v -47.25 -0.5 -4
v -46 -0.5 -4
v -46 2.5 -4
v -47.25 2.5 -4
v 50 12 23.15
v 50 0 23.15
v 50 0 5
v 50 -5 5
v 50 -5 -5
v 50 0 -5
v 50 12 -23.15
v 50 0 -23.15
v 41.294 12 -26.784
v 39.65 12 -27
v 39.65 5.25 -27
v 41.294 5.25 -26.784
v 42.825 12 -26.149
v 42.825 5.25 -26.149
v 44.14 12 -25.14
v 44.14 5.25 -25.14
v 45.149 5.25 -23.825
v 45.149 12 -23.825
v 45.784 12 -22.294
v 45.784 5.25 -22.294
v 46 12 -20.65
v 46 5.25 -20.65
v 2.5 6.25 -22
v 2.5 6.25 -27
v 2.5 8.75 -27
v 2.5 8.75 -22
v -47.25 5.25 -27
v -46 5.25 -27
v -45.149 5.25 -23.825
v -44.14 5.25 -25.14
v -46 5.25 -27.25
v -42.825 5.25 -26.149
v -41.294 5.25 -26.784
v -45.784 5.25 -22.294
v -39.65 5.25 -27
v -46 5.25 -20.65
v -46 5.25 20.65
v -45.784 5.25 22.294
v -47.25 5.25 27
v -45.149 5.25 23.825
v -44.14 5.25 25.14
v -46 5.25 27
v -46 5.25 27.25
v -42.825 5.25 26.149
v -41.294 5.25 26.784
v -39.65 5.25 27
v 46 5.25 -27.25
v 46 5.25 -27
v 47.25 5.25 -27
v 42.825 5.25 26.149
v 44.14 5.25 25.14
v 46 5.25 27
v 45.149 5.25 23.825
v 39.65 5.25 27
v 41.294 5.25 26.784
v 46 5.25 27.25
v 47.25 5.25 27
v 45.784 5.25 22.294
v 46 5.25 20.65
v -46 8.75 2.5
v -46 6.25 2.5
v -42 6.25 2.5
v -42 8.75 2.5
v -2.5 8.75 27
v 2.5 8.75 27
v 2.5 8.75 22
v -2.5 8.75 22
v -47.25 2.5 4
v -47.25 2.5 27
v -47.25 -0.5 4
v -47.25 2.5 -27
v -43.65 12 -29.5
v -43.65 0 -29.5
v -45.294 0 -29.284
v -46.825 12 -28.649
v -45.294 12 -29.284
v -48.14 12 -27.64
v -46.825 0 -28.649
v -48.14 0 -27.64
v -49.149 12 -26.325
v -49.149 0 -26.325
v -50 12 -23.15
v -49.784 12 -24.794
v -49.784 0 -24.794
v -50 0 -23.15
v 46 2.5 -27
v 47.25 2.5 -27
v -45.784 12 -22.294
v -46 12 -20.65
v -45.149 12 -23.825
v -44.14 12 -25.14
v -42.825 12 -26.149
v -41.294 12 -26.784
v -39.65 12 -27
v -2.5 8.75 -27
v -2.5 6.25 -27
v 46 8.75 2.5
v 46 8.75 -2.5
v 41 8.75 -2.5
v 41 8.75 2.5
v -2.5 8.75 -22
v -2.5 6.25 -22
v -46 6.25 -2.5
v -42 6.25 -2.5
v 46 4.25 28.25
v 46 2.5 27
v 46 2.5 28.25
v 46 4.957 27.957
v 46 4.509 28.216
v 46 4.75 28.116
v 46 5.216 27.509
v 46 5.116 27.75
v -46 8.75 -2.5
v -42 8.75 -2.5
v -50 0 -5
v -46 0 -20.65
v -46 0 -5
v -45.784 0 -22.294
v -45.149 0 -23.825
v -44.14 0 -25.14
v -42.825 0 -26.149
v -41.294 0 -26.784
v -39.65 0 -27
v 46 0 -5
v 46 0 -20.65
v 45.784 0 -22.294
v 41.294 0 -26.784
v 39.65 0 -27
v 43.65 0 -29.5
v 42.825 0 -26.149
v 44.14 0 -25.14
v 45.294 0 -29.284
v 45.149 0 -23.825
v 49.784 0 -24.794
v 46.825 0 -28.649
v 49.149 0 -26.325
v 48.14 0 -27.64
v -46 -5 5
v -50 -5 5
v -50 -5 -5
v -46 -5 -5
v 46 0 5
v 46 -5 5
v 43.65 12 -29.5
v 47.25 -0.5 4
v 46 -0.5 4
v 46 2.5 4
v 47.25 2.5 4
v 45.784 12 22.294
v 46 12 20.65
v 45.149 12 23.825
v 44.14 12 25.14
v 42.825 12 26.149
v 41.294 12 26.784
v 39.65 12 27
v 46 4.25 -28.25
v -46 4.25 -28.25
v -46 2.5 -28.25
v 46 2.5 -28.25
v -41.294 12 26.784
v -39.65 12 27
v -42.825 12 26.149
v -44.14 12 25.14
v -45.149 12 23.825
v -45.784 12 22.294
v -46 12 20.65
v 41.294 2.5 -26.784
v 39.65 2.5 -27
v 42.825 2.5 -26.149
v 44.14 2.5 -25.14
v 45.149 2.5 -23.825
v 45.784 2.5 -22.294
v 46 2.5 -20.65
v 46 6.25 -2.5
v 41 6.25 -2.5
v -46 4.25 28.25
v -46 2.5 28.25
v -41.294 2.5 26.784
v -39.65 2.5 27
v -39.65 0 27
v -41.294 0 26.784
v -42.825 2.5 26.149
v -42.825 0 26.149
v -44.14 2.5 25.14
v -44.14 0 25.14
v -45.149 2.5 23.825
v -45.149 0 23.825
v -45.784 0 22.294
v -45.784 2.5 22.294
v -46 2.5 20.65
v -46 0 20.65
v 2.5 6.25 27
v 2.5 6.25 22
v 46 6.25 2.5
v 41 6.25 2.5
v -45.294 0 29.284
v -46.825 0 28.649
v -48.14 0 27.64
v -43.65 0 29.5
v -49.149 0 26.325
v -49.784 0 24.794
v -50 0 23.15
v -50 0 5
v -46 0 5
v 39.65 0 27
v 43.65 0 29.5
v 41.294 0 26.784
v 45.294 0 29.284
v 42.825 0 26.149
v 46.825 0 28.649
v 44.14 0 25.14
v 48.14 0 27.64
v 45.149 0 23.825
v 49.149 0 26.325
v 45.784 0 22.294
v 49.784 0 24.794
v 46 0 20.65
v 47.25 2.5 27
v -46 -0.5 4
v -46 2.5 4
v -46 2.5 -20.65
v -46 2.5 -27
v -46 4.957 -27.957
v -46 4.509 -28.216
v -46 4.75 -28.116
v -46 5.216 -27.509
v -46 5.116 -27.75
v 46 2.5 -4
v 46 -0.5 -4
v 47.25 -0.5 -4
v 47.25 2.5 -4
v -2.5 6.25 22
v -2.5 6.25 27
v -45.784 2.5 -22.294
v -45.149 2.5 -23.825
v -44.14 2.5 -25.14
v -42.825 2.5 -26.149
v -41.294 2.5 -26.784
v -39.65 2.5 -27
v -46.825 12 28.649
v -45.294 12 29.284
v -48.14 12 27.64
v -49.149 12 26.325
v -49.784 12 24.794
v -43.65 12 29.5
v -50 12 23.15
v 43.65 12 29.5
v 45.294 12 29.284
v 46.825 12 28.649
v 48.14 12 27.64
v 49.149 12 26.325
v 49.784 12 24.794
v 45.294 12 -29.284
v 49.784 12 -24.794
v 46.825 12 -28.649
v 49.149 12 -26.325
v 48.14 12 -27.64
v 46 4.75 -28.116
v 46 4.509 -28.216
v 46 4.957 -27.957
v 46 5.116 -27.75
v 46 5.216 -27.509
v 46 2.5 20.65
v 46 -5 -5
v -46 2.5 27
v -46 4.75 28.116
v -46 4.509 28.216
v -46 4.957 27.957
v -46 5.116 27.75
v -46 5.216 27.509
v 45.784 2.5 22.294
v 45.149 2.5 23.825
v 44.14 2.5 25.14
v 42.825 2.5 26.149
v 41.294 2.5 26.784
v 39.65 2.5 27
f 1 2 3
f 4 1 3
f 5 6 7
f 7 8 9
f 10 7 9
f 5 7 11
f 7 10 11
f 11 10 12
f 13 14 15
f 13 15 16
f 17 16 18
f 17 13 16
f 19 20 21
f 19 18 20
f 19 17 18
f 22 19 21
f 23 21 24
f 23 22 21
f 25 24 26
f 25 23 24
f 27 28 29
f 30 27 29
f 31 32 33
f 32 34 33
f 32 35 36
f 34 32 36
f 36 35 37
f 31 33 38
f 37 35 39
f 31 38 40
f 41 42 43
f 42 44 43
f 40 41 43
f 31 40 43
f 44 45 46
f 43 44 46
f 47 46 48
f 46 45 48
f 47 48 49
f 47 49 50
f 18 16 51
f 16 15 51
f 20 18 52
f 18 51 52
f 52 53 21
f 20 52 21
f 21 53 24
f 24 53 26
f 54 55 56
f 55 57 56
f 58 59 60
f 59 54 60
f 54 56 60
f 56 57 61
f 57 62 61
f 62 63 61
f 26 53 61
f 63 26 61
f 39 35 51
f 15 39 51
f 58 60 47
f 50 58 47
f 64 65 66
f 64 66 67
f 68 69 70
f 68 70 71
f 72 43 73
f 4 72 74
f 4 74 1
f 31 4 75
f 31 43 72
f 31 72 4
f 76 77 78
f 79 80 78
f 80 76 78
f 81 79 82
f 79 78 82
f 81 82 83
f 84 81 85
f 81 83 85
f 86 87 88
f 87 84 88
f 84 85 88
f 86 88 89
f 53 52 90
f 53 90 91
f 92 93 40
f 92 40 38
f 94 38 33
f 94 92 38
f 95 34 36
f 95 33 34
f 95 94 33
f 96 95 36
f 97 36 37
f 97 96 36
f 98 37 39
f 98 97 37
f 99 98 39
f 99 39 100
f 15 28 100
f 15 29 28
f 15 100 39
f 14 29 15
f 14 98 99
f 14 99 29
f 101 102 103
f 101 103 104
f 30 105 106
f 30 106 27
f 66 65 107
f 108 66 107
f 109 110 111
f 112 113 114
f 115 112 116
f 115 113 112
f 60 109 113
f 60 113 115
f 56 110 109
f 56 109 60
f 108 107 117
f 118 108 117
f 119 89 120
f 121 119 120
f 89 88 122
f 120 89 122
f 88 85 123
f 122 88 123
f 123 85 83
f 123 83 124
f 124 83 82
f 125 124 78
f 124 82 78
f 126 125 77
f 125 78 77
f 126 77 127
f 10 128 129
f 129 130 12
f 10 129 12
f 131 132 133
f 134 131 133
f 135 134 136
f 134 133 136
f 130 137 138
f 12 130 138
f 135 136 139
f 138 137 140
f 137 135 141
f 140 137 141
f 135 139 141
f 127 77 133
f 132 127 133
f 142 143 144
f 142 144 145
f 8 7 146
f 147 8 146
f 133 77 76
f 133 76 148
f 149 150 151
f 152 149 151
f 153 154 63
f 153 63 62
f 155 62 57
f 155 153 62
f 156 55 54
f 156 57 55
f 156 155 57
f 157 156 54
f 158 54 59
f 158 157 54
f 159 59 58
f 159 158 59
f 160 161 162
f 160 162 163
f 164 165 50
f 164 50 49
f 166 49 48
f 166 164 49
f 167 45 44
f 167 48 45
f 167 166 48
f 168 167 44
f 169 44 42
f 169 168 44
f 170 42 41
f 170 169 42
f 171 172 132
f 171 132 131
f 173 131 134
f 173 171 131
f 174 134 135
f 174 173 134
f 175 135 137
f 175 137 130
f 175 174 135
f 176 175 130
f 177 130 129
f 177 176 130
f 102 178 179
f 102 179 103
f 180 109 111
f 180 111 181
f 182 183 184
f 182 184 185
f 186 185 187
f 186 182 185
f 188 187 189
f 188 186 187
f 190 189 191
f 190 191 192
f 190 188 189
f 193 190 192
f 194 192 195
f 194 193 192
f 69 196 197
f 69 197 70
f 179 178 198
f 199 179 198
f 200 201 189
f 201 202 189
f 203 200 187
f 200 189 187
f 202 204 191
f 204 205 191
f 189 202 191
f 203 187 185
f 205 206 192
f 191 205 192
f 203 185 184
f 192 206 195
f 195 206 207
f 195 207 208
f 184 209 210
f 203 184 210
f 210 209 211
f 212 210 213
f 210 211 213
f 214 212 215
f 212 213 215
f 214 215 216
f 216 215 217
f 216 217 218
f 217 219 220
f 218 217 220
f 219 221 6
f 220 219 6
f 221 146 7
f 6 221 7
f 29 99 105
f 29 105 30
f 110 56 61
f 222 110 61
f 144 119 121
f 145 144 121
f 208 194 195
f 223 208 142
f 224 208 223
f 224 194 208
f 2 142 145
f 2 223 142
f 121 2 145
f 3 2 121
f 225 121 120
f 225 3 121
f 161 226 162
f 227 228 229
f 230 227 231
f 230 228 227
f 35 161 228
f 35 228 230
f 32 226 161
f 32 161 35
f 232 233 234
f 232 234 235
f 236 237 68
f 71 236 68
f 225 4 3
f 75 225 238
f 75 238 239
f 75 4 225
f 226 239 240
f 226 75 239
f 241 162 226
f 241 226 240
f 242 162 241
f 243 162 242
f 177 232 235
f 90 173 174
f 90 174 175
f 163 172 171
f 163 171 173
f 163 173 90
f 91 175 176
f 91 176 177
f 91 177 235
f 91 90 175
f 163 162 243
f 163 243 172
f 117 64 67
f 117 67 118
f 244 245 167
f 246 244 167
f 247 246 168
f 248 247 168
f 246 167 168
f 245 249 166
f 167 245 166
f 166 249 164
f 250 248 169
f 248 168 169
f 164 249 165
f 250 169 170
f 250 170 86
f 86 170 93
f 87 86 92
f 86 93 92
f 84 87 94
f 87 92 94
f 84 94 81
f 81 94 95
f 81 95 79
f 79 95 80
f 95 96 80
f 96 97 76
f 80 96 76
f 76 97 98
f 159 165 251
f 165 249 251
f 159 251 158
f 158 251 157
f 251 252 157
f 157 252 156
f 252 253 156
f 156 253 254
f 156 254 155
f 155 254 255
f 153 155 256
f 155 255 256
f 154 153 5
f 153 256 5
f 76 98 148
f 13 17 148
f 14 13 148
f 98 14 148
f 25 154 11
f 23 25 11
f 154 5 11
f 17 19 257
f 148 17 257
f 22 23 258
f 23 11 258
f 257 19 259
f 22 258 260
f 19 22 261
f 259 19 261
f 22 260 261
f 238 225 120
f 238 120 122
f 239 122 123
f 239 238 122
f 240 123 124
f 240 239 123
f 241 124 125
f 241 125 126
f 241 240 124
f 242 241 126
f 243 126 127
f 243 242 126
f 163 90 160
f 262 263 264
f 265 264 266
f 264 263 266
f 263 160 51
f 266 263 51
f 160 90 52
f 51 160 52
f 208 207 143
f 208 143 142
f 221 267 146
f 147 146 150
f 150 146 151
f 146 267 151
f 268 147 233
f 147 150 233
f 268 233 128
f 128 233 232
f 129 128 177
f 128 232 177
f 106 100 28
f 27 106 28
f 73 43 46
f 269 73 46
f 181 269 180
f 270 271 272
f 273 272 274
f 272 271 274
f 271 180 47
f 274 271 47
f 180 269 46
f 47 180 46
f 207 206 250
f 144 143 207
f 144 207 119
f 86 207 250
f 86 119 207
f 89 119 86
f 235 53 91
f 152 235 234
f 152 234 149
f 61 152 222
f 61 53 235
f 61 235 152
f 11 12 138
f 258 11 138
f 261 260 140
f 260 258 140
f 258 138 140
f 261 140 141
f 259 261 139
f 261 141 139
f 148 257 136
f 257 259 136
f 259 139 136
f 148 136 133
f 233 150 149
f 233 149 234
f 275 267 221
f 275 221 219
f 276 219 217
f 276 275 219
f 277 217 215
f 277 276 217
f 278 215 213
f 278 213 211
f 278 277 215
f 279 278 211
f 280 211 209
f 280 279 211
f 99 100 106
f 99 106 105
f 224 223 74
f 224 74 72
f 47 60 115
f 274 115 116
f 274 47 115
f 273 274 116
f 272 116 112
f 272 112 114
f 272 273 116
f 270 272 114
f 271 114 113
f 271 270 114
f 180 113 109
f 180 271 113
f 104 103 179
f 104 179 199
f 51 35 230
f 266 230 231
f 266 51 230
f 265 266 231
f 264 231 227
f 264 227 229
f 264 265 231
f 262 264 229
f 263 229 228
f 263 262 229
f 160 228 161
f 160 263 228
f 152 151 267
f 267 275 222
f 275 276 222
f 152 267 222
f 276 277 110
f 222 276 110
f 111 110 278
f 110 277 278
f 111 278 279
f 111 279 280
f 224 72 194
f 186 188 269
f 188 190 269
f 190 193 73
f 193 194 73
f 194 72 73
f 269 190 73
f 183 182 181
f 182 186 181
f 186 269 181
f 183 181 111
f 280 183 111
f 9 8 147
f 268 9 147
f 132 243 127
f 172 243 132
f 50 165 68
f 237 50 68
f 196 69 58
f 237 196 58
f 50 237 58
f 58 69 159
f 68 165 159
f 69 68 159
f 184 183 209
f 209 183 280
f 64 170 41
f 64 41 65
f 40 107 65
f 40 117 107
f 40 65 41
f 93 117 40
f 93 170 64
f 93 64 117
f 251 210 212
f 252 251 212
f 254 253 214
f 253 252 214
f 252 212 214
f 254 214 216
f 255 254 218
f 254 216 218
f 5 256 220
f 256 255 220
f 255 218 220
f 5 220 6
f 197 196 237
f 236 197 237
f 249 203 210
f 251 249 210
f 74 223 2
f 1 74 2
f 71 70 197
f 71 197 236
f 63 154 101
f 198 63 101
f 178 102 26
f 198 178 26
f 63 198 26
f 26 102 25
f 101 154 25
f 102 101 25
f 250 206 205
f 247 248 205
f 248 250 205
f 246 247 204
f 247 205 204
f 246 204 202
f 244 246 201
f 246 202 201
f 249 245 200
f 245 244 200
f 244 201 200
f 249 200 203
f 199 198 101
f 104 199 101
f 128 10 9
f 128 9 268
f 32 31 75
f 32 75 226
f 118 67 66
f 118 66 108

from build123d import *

# Parameters (mm, degrees)
SKETCH1_W                      = 100
SKETCH1_H                      = 59
BOSS_EXTRUDE1_DEPTH            = 12
SKETCH2_W                      = 92
SKETCH2_H                      = 54
CUT_EXTRUDE1_DEPTH             = 60.281109976
SKETCH3_W                      = 54
SKETCH3_H                      = 2.75
CUT_EXTRUDE2_DEPTH             = 1.25
SKETCH4_W                      = 54
SKETCH4_H                      = 2.75
CUT_EXTRUDE3_DEPTH             = 1.25
SKETCH5_W                      = 92
SKETCH5_H                      = 2.75
CUT_EXTRUDE4_DEPTH             = 1.25
SKETCH6_W                      = 92
SKETCH6_H                      = 2.75
CUT_EXTRUDE5_DEPTH             = 1.25
FILLET1_R                      = 1
SKETCH7_W                      = 4
SKETCH7_H                      = 10
BOSS_EXTRUDE2_DEPTH            = 5
CUT_EXTRUDE6_REACH             = 103.145
SKETCH8_W                      = 8
SKETCH8_H                      = 3
CUT_EXTRUDE6_DIRECTION_2_REACH = 103.145
FILLET2_R                      = 6.35
SKETCH9_W                      = 5
SKETCH9_H                      = 2.5
BOSS_EXTRUDE3_DEPTH            = 5
SKETCH10_W                     = 5
SKETCH10_H                     = 2.5
BOSS_EXTRUDE4_DEPTH            = 5
SKETCH11_W                     = 5
SKETCH11_H                     = 2.5
BOSS_EXTRUDE5_DEPTH            = 5
SKETCH12_W                     = 5
SKETCH12_H                     = 2.5
BOSS_EXTRUDE6_DEPTH            = 4


with BuildPart() as part:
    # Sketch1 → Boss-Extrude1 (new body)
    with BuildSketch(Plane(origin=(0, 0, 0), x_dir=(1, 0, 0), z_dir=(0, 1, 0))):
        Rectangle(SKETCH1_W, SKETCH1_H)
    extrude(amount=BOSS_EXTRUDE1_DEPTH)

    # Sketch2 → Cut-Extrude1 (cut, through all)
    with BuildSketch(Plane(origin=(0, 12, 0), x_dir=(1, 0, 0), z_dir=(0, 1, 0))):
        Rectangle(SKETCH2_W, SKETCH2_H)
    extrude(amount=-CUT_EXTRUDE1_DEPTH, mode=Mode.SUBTRACT)

    # Sketch3 → Cut-Extrude2 (cut)
    with BuildSketch(Plane(origin=(-46, 0, 0), x_dir=(0, 0, -1), z_dir=(1, 0, 0))):
        with Locations((0, 3.875)):
            Rectangle(SKETCH3_W, SKETCH3_H)
    extrude(amount=-CUT_EXTRUDE2_DEPTH, mode=Mode.SUBTRACT)

    # Sketch4 → Cut-Extrude3 (cut)
    with BuildSketch(Plane.ZY.offset(-46)):
        with Locations((0, 3.875)):
            Rectangle(SKETCH4_W, SKETCH4_H)
    extrude(amount=-CUT_EXTRUDE3_DEPTH, mode=Mode.SUBTRACT)

    # Sketch5 → Cut-Extrude4 (cut)
    with BuildSketch(Plane.XY.offset(-27)):
        with Locations((0, 3.875)):
            Rectangle(SKETCH5_W, SKETCH5_H)
    extrude(amount=-CUT_EXTRUDE4_DEPTH, mode=Mode.SUBTRACT)

    # Sketch6 → Cut-Extrude5 (cut)
    with BuildSketch(Plane(origin=(0, 0, 27), x_dir=(-1, 0, 0), z_dir=(0, 0, -1))):
        with Locations((0, 3.875)):
            Rectangle(SKETCH6_W, SKETCH6_H)
    extrude(amount=-CUT_EXTRUDE5_DEPTH, mode=Mode.SUBTRACT)

    # Fillet1
    fillet1_edges = [part.edges().sort_by_distance(p)[0] for p in [
        (0, 5.25, -28.25),
        (0, 5.25, 28.25),
    ]]
    fillet(fillet1_edges, radius=FILLET1_R)

    # Sketch7 → Boss-Extrude2 (add)
    with BuildSketch(Plane.XZ):
        with Locations((-48, 0)):
            Rectangle(SKETCH7_W, SKETCH7_H)
    boss_extrude2 = extrude(amount=BOSS_EXTRUDE2_DEPTH)

    # Mirror2: Boss-Extrude2 across plane
    add(boss_extrude2.mirror(Plane(origin=(0, 0, 0), x_dir=(0, 0, 1), z_dir=(1, 0, 0))))

    # Cut-Extrude6: up to this face of the body (flat: up to its plane)
    cut_extrude6_end = Plane(part.part.faces().sort_by_distance((-47.25, 3.875, 0))[0])
    # Sketch8 → Cut-Extrude6 (cut, up to the picked face)
    with BuildSketch(Plane(origin=(-46, 0, 0), x_dir=(0, 0, -1), z_dir=(1, 0, 0)), mode=Mode.PRIVATE) as cut_extrude6_sk1:
        with Locations((0, 1)):
            Rectangle(SKETCH8_W, SKETCH8_H)
    cut_extrude6_tool1 = split(extrude(cut_extrude6_sk1.sketch, amount=-CUT_EXTRUDE6_REACH, mode=Mode.PRIVATE), bisect_by=cut_extrude6_end, keep=Keep.BOTH, mode=Mode.PRIVATE)
    add(cut_extrude6_tool1.solids().sort_by(Axis((-46, 1, 0), (-1, 0, 0)))[0], mode=Mode.SUBTRACT)

    # Cut-Extrude6 direction 2: up to this face of the body (flat: up to its plane)
    cut_extrude6_direction_2_end = Plane(part.part.faces().sort_by_distance((47.25, 3.875, 0))[0])
    # Sketch8 → Cut-Extrude6 direction 2 (cut, up to the picked face)
    with BuildSketch(Plane(origin=(-46, 0, 0), x_dir=(0, 0, -1), z_dir=(1, 0, 0)), mode=Mode.PRIVATE) as cut_extrude6_direction_2_sk1:
        with Locations((0, 1)):
            Rectangle(SKETCH8_W, SKETCH8_H)
    cut_extrude6_direction_2_tool1 = split(extrude(cut_extrude6_direction_2_sk1.sketch, amount=CUT_EXTRUDE6_DIRECTION_2_REACH, mode=Mode.PRIVATE), bisect_by=cut_extrude6_direction_2_end, keep=Keep.BOTH, mode=Mode.PRIVATE)
    add(cut_extrude6_direction_2_tool1.solids().sort_by(Axis((-46, 1, 0), (1, 0, 0)))[0], mode=Mode.SUBTRACT)

    # Fillet2
    # the kernel refuses this fillet: 6.35 mm, written as the material it adds along each edge
    with BuildSketch(Plane(origin=(-46, 18.375, -27), x_dir=(1, 0, 0), z_dir=(0, -1, 0))) as fillet2_piece_1_section:
        with BuildLine():
            CenterArc((FILLET2_R, FILLET2_R), FILLET2_R, 180, 90)
            Line((0, FILLET2_R), (0, 0))
            Line((0, 0), (FILLET2_R, 0))
        make_face()
    fillet2_piece_1 = extrude(amount=18.375, mode=Mode.PRIVATE)
    fillet2_piece_1 = split(fillet2_piece_1, bisect_by=Plane(origin=(-44.562391024, 5.25, -25.562391024), z_dir=(0, 1, 0)), keep=Keep.TOP, mode=Mode.PRIVATE)
    fillet2_piece_1 = split(fillet2_piece_1, bisect_by=Plane(origin=(-44.562391024, 12, -25.562391024), z_dir=(0, -1, 0)), keep=Keep.TOP, mode=Mode.PRIVATE)
    add(fillet2_piece_1)
    with BuildSketch(Plane(origin=(-46, 2.5, -27), x_dir=(1, 0, 0), z_dir=(0, -1, 0)), Plane(origin=(-46, 2.5, 27), x_dir=(0, 0, -1), z_dir=(0, -1, 0))) as fillet2_piece_2:
        with BuildLine():
            CenterArc((FILLET2_R, FILLET2_R), FILLET2_R, 180, 90)
            Line((0, FILLET2_R), (0, 0))
            Line((0, 0), (FILLET2_R, 0))
        make_face()
    extrude(amount=2.5)
    with BuildSketch(Plane(origin=(46, 18.375, -27), x_dir=(-1, 0, 0), z_dir=(0, -1, 0))) as fillet2_piece_3_section:
        with BuildLine():
            CenterArc((FILLET2_R, -FILLET2_R), FILLET2_R, 90, 90)
            Line((0, -FILLET2_R), (0, 0))
            Line((0, 0), (FILLET2_R, 0))
        make_face()
    fillet2_piece_3 = extrude(amount=18.375, mode=Mode.PRIVATE)
    fillet2_piece_3 = split(fillet2_piece_3, bisect_by=Plane(origin=(44.562391024, 5.25, -25.562391024), z_dir=(0, 1, 0)), keep=Keep.TOP, mode=Mode.PRIVATE)
    fillet2_piece_3 = split(fillet2_piece_3, bisect_by=Plane(origin=(44.562391024, 12, -25.562391024), z_dir=(0, -1, 0)), keep=Keep.TOP, mode=Mode.PRIVATE)
    add(fillet2_piece_3)
    with BuildSketch(Plane(origin=(46, 2.5, -27), x_dir=(-1, 0, 0), z_dir=(0, -1, 0)), Plane(origin=(46, 2.5, 27), x_dir=(0, 0, -1), z_dir=(0, -1, 0))) as fillet2_piece_4:
        with BuildLine():
            CenterArc((FILLET2_R, -FILLET2_R), FILLET2_R, 90, 90)
            Line((0, -FILLET2_R), (0, 0))
            Line((0, 0), (FILLET2_R, 0))
        make_face()
    extrude(amount=2.5)
    with BuildSketch(Plane(origin=(-46, 18.375, 27), x_dir=(0, 0, -1), z_dir=(0, -1, 0))) as fillet2_piece_5_section:
        with BuildLine():
            CenterArc((FILLET2_R, FILLET2_R), FILLET2_R, 180, 90)
            Line((0, FILLET2_R), (0, 0))
            Line((0, 0), (FILLET2_R, 0))
        make_face()
    fillet2_piece_5 = extrude(amount=18.375, mode=Mode.PRIVATE)
    fillet2_piece_5 = split(fillet2_piece_5, bisect_by=Plane(origin=(-44.562391024, 12, 25.562391024), z_dir=(0, -1, 0)), keep=Keep.TOP, mode=Mode.PRIVATE)
    fillet2_piece_5 = split(fillet2_piece_5, bisect_by=Plane(origin=(-44.562391024, 5.25, 25.562391024), z_dir=(0, 1, 0)), keep=Keep.TOP, mode=Mode.PRIVATE)
    add(fillet2_piece_5)
    with BuildSketch(Plane(origin=(46, 18.375, 27), x_dir=(0, 0, -1), z_dir=(0, -1, 0))) as fillet2_piece_6_section:
        with BuildLine():
            CenterArc((FILLET2_R, -FILLET2_R), FILLET2_R, 90, 90)
            Line((0, -FILLET2_R), (0, 0))
            Line((0, 0), (FILLET2_R, 0))
        make_face()
    fillet2_piece_6 = extrude(amount=18.375, mode=Mode.PRIVATE)
    fillet2_piece_6 = split(fillet2_piece_6, bisect_by=Plane(origin=(44.562391024, 12, 25.562391024), z_dir=(0, -1, 0)), keep=Keep.TOP, mode=Mode.PRIVATE)
    fillet2_piece_6 = split(fillet2_piece_6, bisect_by=Plane(origin=(44.562391024, 5.25, 25.562391024), z_dir=(0, 1, 0)), keep=Keep.TOP, mode=Mode.PRIVATE)
    add(fillet2_piece_6)
    # the kernel refuses this fillet: 6.35 mm, written as the material it takes off along each edge
    with BuildSketch(Plane(origin=(-50, -15.875, -29.5), x_dir=(1, 0, 0), z_dir=(0, 1, 0)), Plane(origin=(-50, -15.875, 29.5), x_dir=(0, 0, -1), z_dir=(0, 1, 0))) as fillet2_2_piece_1:
        with BuildLine():
            CenterArc((FILLET2_R, -FILLET2_R), FILLET2_R, 90, 90)
            Line((0, -FILLET2_R), (0, 0))
            Line((0, 0), (FILLET2_R, 0))
        make_face()
    extrude(amount=43.75, mode=Mode.SUBTRACT)
    with BuildSketch(Plane(origin=(50, -15.875, 29.5), x_dir=(0, 0, -1), z_dir=(0, 1, 0)), Plane(origin=(50, -15.875, -29.5), x_dir=(-1, 0, 0), z_dir=(0, 1, 0))) as fillet2_2_piece_2:
        with BuildLine():
            CenterArc((FILLET2_R, FILLET2_R), FILLET2_R, 180, 90)
            Line((0, FILLET2_R), (0, 0))
            Line((0, 0), (FILLET2_R, 0))
        make_face()
    extrude(amount=43.75, mode=Mode.SUBTRACT)

    # Sketch9 → Boss-Extrude3 (add)
    with BuildSketch(Plane(origin=(0, 0, 27), x_dir=(-1, 0, 0), z_dir=(0, 0, -1))):
        with Locations((0, 7.5)):
            Rectangle(SKETCH9_W, SKETCH9_H)
    extrude(amount=BOSS_EXTRUDE3_DEPTH)

    # Sketch10 → Boss-Extrude4 (add)
    with BuildSketch(Plane.XY.offset(-27)):
        with Locations((0, 7.5)):
            Rectangle(SKETCH10_W, SKETCH10_H)
    extrude(amount=BOSS_EXTRUDE4_DEPTH)

    # Sketch11 → Boss-Extrude5 (add)
    with BuildSketch(Plane.ZY.offset(-46)):
        with Locations((0, 7.5)):
            Rectangle(SKETCH11_W, SKETCH11_H)
    extrude(amount=BOSS_EXTRUDE5_DEPTH)

    # Sketch12 → Boss-Extrude6 (add)
    with BuildSketch(Plane(origin=(-46, 0, 0), x_dir=(0, 0, -1), z_dir=(1, 0, 0))):
        with Locations((0, 7.5)):
            Rectangle(SKETCH12_W, SKETCH12_H)
    extrude(amount=BOSS_EXTRUDE6_DEPTH)


solid = part.part
